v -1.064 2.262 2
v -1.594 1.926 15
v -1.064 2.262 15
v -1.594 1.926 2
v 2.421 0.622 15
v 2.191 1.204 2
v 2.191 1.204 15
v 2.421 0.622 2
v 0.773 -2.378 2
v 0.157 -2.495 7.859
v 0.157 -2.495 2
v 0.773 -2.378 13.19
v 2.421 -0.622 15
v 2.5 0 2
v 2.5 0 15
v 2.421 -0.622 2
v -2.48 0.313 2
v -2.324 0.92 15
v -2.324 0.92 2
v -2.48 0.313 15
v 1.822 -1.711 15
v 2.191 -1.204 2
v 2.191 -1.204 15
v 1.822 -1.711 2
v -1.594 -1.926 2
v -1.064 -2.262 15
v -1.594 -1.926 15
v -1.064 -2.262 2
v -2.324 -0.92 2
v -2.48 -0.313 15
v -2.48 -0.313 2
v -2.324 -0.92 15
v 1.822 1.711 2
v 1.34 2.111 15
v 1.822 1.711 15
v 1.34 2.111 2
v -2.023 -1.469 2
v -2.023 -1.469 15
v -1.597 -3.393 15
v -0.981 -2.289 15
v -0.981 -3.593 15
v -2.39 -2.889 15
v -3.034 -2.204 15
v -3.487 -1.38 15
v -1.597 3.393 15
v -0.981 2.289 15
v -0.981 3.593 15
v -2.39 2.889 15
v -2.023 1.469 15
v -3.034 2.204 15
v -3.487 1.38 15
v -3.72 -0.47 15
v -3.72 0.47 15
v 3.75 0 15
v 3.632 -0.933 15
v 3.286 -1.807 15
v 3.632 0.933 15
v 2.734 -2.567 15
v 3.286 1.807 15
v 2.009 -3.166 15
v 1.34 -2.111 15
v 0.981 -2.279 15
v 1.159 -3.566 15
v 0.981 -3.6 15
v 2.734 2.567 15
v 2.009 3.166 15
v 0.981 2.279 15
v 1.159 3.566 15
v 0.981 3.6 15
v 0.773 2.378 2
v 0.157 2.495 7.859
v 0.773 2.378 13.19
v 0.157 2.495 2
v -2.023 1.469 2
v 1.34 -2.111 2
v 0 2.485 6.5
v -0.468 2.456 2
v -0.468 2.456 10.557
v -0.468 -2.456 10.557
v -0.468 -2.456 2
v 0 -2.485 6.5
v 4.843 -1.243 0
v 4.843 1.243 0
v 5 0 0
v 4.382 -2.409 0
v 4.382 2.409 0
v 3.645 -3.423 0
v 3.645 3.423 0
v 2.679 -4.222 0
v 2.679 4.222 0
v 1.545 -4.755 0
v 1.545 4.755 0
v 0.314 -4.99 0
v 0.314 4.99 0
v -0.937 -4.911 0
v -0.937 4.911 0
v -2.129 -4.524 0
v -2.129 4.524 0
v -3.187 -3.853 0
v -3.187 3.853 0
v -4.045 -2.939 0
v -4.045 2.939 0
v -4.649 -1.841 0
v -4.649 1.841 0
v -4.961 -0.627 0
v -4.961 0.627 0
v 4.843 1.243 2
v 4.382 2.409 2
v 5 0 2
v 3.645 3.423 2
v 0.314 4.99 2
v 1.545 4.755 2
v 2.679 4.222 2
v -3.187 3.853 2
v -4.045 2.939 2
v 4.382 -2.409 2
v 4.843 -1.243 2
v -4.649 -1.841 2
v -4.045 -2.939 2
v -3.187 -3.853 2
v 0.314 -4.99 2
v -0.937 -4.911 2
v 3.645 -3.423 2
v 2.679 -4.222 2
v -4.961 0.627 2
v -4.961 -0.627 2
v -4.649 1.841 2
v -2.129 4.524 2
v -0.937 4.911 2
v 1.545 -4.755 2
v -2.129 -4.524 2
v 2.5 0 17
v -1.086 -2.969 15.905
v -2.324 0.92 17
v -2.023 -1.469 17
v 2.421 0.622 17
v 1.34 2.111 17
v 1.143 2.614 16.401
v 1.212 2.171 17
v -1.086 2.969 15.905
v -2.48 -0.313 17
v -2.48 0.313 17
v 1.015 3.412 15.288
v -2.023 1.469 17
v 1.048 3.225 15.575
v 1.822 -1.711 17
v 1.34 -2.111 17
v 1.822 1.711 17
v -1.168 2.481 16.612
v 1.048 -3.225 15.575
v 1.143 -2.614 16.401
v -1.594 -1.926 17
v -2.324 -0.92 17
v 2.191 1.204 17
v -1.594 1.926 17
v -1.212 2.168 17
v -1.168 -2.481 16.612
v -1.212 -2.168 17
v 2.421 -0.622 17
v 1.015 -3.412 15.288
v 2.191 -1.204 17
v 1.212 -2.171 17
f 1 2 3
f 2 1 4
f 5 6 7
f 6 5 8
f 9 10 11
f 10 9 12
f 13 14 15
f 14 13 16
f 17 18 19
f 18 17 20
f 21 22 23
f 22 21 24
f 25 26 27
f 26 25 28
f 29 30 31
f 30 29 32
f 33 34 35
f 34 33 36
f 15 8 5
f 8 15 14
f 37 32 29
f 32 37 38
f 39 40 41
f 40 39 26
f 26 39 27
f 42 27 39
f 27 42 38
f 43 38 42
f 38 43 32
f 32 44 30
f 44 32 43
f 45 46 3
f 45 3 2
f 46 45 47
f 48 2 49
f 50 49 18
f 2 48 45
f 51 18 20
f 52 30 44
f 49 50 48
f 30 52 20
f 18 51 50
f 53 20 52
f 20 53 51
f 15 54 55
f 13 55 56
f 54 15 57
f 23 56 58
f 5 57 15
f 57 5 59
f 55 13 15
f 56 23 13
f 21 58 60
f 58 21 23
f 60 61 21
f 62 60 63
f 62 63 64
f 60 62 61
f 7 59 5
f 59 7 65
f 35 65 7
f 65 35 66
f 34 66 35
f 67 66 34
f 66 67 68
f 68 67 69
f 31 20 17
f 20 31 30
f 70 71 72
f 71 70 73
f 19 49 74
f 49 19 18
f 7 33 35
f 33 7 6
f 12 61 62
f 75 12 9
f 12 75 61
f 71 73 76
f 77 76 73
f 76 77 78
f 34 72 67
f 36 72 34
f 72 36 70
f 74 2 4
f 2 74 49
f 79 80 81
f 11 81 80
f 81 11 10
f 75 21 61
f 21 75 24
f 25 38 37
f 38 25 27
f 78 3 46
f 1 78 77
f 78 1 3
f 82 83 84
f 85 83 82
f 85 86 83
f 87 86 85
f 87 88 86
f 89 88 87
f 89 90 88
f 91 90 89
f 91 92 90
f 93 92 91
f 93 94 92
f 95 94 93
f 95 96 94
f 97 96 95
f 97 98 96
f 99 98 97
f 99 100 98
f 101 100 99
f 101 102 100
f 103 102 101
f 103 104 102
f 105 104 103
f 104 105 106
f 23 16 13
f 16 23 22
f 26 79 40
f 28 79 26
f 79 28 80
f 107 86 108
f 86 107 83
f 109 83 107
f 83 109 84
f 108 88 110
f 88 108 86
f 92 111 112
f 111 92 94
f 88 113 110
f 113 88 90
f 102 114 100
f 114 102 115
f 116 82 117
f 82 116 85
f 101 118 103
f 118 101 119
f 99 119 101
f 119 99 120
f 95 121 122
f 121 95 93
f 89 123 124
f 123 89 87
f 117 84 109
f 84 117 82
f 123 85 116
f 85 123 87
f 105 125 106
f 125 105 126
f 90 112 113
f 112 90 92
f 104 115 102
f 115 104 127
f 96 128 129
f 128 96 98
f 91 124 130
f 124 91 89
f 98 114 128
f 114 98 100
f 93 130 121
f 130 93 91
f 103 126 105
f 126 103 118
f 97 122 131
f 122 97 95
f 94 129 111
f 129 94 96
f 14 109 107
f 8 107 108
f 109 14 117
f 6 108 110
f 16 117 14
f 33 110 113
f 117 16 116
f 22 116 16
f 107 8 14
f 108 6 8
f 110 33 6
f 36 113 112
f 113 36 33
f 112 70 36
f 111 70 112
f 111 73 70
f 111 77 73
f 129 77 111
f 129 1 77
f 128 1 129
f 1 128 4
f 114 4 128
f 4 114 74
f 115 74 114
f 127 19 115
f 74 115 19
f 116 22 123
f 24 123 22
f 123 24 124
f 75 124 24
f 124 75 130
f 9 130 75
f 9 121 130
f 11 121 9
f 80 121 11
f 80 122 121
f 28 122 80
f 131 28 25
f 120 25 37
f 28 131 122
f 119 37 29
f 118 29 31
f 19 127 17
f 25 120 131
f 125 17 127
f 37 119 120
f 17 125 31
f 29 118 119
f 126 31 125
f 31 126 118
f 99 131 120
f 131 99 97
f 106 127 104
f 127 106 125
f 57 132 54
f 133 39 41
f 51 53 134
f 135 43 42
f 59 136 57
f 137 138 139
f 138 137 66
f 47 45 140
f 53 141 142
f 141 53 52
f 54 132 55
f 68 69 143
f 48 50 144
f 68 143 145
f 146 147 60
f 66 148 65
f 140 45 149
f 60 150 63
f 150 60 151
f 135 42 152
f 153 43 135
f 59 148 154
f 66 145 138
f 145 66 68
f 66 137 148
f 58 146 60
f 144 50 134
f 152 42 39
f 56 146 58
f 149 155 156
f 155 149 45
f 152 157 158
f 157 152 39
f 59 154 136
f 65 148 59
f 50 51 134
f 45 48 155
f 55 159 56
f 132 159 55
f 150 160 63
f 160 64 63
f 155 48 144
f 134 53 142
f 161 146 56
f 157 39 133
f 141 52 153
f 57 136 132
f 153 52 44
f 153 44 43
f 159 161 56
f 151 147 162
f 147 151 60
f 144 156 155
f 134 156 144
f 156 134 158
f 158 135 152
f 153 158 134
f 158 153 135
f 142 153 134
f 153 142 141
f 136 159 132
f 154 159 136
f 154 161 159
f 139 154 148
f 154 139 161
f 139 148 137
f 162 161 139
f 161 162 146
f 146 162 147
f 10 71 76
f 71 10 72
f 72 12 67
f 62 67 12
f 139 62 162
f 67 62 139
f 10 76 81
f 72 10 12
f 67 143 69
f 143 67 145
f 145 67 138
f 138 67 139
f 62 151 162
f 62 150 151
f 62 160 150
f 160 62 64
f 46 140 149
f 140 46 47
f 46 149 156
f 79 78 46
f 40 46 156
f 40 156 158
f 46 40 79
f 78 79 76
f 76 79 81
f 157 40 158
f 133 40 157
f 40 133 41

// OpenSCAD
quality=25;

pin_radius=2.5;
pin_length=15;

backing_thickness=2;



difference()
{
    union()
    {
        cylinder(r=pin_radius,h=pin_length,$fn=quality);
        cylinder(r=pin_radius*2,h=backing_thickness,$fn=quality);
        
        //bell clip
        translate([0,0,pin_length]) cylinder(r1=pin_radius*1.5,r2=pin_radius,h=backing_thickness,$fn=quality);
    }
    translate([0,pin_radius*1.5,pin_length+backing_thickness*2]) scale([1,1,5]) rotate([90,90,0]) cylinder(r=pin_radius,h=pin_radius*3,$fn=3);
}
